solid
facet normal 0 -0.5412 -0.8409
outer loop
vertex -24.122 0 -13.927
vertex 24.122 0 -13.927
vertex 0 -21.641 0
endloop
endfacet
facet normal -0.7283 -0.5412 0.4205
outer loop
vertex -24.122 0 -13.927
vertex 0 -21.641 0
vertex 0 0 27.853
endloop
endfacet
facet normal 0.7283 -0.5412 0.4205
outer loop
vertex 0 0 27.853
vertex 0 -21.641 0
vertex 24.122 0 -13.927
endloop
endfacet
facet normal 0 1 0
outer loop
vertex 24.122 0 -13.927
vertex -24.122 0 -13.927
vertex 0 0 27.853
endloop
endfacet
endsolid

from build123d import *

# Parameters (mm, degrees)
F1_DEPTH = 50.8
F4_DEPTH = 38.1
F6_DEPTH = 76.2
F9_DEPTH = 38.1


with BuildPart() as f1:
    # F0 (on Front) → F1 (new body)
    with BuildSketch(Plane.XZ):
        Polygon((0, 27.8534215753), (-24.1217706665, -13.9267107877), (24.1217706665, -13.9267107877), align=None)
    extrude(amount=F1_DEPTH)

    # F3 (on Right) → F4 (cut, symmetric)
    with BuildSketch(Plane.YZ):
        Polygon((-4.1414177977, -23.6890129745), (0, -13.9267107877), (-21.6406751424, 0), (-53.4481443465, 0), (-53.4481443465, -20.1891623437), align=None)
    extrude(amount=F4_DEPTH, both=True, mode=Mode.SUBTRACT)

    # F5 (on face) → F6 (cut)
    with BuildSketch(Plane(origin=(-12.0608853333, 0, -20.8900661815), x_dir=(0.8660254038, 0, -0.5), z_dir=(0.5, 0, 0.8660254038))):
        Polygon((0, -21.6406751424), (-13.9267107877, 0), (-23.6785002053, -57.1040175855), (0, -58.6630254984), align=None)
    extrude(amount=F6_DEPTH, mode=Mode.SUBTRACT)

    # F8 (on face) → F9 (cut, symmetric)
    with BuildSketch(Plane(origin=(-4.0202951111, 0, 6.9633553938), x_dir=(0.8660254038, 0, 0.5), z_dir=(0.5, 0, -0.8660254038))):
        Polygon((-6.0183512978, 52.3292906582), (0, 21.6406751424), (13.9267107877, 0), (24.3944823742, 42.0836023986), (17.7801791579, 52.3292906582), align=None)
    extrude(amount=F9_DEPTH, both=True, mode=Mode.SUBTRACT)


solid = f1.part
